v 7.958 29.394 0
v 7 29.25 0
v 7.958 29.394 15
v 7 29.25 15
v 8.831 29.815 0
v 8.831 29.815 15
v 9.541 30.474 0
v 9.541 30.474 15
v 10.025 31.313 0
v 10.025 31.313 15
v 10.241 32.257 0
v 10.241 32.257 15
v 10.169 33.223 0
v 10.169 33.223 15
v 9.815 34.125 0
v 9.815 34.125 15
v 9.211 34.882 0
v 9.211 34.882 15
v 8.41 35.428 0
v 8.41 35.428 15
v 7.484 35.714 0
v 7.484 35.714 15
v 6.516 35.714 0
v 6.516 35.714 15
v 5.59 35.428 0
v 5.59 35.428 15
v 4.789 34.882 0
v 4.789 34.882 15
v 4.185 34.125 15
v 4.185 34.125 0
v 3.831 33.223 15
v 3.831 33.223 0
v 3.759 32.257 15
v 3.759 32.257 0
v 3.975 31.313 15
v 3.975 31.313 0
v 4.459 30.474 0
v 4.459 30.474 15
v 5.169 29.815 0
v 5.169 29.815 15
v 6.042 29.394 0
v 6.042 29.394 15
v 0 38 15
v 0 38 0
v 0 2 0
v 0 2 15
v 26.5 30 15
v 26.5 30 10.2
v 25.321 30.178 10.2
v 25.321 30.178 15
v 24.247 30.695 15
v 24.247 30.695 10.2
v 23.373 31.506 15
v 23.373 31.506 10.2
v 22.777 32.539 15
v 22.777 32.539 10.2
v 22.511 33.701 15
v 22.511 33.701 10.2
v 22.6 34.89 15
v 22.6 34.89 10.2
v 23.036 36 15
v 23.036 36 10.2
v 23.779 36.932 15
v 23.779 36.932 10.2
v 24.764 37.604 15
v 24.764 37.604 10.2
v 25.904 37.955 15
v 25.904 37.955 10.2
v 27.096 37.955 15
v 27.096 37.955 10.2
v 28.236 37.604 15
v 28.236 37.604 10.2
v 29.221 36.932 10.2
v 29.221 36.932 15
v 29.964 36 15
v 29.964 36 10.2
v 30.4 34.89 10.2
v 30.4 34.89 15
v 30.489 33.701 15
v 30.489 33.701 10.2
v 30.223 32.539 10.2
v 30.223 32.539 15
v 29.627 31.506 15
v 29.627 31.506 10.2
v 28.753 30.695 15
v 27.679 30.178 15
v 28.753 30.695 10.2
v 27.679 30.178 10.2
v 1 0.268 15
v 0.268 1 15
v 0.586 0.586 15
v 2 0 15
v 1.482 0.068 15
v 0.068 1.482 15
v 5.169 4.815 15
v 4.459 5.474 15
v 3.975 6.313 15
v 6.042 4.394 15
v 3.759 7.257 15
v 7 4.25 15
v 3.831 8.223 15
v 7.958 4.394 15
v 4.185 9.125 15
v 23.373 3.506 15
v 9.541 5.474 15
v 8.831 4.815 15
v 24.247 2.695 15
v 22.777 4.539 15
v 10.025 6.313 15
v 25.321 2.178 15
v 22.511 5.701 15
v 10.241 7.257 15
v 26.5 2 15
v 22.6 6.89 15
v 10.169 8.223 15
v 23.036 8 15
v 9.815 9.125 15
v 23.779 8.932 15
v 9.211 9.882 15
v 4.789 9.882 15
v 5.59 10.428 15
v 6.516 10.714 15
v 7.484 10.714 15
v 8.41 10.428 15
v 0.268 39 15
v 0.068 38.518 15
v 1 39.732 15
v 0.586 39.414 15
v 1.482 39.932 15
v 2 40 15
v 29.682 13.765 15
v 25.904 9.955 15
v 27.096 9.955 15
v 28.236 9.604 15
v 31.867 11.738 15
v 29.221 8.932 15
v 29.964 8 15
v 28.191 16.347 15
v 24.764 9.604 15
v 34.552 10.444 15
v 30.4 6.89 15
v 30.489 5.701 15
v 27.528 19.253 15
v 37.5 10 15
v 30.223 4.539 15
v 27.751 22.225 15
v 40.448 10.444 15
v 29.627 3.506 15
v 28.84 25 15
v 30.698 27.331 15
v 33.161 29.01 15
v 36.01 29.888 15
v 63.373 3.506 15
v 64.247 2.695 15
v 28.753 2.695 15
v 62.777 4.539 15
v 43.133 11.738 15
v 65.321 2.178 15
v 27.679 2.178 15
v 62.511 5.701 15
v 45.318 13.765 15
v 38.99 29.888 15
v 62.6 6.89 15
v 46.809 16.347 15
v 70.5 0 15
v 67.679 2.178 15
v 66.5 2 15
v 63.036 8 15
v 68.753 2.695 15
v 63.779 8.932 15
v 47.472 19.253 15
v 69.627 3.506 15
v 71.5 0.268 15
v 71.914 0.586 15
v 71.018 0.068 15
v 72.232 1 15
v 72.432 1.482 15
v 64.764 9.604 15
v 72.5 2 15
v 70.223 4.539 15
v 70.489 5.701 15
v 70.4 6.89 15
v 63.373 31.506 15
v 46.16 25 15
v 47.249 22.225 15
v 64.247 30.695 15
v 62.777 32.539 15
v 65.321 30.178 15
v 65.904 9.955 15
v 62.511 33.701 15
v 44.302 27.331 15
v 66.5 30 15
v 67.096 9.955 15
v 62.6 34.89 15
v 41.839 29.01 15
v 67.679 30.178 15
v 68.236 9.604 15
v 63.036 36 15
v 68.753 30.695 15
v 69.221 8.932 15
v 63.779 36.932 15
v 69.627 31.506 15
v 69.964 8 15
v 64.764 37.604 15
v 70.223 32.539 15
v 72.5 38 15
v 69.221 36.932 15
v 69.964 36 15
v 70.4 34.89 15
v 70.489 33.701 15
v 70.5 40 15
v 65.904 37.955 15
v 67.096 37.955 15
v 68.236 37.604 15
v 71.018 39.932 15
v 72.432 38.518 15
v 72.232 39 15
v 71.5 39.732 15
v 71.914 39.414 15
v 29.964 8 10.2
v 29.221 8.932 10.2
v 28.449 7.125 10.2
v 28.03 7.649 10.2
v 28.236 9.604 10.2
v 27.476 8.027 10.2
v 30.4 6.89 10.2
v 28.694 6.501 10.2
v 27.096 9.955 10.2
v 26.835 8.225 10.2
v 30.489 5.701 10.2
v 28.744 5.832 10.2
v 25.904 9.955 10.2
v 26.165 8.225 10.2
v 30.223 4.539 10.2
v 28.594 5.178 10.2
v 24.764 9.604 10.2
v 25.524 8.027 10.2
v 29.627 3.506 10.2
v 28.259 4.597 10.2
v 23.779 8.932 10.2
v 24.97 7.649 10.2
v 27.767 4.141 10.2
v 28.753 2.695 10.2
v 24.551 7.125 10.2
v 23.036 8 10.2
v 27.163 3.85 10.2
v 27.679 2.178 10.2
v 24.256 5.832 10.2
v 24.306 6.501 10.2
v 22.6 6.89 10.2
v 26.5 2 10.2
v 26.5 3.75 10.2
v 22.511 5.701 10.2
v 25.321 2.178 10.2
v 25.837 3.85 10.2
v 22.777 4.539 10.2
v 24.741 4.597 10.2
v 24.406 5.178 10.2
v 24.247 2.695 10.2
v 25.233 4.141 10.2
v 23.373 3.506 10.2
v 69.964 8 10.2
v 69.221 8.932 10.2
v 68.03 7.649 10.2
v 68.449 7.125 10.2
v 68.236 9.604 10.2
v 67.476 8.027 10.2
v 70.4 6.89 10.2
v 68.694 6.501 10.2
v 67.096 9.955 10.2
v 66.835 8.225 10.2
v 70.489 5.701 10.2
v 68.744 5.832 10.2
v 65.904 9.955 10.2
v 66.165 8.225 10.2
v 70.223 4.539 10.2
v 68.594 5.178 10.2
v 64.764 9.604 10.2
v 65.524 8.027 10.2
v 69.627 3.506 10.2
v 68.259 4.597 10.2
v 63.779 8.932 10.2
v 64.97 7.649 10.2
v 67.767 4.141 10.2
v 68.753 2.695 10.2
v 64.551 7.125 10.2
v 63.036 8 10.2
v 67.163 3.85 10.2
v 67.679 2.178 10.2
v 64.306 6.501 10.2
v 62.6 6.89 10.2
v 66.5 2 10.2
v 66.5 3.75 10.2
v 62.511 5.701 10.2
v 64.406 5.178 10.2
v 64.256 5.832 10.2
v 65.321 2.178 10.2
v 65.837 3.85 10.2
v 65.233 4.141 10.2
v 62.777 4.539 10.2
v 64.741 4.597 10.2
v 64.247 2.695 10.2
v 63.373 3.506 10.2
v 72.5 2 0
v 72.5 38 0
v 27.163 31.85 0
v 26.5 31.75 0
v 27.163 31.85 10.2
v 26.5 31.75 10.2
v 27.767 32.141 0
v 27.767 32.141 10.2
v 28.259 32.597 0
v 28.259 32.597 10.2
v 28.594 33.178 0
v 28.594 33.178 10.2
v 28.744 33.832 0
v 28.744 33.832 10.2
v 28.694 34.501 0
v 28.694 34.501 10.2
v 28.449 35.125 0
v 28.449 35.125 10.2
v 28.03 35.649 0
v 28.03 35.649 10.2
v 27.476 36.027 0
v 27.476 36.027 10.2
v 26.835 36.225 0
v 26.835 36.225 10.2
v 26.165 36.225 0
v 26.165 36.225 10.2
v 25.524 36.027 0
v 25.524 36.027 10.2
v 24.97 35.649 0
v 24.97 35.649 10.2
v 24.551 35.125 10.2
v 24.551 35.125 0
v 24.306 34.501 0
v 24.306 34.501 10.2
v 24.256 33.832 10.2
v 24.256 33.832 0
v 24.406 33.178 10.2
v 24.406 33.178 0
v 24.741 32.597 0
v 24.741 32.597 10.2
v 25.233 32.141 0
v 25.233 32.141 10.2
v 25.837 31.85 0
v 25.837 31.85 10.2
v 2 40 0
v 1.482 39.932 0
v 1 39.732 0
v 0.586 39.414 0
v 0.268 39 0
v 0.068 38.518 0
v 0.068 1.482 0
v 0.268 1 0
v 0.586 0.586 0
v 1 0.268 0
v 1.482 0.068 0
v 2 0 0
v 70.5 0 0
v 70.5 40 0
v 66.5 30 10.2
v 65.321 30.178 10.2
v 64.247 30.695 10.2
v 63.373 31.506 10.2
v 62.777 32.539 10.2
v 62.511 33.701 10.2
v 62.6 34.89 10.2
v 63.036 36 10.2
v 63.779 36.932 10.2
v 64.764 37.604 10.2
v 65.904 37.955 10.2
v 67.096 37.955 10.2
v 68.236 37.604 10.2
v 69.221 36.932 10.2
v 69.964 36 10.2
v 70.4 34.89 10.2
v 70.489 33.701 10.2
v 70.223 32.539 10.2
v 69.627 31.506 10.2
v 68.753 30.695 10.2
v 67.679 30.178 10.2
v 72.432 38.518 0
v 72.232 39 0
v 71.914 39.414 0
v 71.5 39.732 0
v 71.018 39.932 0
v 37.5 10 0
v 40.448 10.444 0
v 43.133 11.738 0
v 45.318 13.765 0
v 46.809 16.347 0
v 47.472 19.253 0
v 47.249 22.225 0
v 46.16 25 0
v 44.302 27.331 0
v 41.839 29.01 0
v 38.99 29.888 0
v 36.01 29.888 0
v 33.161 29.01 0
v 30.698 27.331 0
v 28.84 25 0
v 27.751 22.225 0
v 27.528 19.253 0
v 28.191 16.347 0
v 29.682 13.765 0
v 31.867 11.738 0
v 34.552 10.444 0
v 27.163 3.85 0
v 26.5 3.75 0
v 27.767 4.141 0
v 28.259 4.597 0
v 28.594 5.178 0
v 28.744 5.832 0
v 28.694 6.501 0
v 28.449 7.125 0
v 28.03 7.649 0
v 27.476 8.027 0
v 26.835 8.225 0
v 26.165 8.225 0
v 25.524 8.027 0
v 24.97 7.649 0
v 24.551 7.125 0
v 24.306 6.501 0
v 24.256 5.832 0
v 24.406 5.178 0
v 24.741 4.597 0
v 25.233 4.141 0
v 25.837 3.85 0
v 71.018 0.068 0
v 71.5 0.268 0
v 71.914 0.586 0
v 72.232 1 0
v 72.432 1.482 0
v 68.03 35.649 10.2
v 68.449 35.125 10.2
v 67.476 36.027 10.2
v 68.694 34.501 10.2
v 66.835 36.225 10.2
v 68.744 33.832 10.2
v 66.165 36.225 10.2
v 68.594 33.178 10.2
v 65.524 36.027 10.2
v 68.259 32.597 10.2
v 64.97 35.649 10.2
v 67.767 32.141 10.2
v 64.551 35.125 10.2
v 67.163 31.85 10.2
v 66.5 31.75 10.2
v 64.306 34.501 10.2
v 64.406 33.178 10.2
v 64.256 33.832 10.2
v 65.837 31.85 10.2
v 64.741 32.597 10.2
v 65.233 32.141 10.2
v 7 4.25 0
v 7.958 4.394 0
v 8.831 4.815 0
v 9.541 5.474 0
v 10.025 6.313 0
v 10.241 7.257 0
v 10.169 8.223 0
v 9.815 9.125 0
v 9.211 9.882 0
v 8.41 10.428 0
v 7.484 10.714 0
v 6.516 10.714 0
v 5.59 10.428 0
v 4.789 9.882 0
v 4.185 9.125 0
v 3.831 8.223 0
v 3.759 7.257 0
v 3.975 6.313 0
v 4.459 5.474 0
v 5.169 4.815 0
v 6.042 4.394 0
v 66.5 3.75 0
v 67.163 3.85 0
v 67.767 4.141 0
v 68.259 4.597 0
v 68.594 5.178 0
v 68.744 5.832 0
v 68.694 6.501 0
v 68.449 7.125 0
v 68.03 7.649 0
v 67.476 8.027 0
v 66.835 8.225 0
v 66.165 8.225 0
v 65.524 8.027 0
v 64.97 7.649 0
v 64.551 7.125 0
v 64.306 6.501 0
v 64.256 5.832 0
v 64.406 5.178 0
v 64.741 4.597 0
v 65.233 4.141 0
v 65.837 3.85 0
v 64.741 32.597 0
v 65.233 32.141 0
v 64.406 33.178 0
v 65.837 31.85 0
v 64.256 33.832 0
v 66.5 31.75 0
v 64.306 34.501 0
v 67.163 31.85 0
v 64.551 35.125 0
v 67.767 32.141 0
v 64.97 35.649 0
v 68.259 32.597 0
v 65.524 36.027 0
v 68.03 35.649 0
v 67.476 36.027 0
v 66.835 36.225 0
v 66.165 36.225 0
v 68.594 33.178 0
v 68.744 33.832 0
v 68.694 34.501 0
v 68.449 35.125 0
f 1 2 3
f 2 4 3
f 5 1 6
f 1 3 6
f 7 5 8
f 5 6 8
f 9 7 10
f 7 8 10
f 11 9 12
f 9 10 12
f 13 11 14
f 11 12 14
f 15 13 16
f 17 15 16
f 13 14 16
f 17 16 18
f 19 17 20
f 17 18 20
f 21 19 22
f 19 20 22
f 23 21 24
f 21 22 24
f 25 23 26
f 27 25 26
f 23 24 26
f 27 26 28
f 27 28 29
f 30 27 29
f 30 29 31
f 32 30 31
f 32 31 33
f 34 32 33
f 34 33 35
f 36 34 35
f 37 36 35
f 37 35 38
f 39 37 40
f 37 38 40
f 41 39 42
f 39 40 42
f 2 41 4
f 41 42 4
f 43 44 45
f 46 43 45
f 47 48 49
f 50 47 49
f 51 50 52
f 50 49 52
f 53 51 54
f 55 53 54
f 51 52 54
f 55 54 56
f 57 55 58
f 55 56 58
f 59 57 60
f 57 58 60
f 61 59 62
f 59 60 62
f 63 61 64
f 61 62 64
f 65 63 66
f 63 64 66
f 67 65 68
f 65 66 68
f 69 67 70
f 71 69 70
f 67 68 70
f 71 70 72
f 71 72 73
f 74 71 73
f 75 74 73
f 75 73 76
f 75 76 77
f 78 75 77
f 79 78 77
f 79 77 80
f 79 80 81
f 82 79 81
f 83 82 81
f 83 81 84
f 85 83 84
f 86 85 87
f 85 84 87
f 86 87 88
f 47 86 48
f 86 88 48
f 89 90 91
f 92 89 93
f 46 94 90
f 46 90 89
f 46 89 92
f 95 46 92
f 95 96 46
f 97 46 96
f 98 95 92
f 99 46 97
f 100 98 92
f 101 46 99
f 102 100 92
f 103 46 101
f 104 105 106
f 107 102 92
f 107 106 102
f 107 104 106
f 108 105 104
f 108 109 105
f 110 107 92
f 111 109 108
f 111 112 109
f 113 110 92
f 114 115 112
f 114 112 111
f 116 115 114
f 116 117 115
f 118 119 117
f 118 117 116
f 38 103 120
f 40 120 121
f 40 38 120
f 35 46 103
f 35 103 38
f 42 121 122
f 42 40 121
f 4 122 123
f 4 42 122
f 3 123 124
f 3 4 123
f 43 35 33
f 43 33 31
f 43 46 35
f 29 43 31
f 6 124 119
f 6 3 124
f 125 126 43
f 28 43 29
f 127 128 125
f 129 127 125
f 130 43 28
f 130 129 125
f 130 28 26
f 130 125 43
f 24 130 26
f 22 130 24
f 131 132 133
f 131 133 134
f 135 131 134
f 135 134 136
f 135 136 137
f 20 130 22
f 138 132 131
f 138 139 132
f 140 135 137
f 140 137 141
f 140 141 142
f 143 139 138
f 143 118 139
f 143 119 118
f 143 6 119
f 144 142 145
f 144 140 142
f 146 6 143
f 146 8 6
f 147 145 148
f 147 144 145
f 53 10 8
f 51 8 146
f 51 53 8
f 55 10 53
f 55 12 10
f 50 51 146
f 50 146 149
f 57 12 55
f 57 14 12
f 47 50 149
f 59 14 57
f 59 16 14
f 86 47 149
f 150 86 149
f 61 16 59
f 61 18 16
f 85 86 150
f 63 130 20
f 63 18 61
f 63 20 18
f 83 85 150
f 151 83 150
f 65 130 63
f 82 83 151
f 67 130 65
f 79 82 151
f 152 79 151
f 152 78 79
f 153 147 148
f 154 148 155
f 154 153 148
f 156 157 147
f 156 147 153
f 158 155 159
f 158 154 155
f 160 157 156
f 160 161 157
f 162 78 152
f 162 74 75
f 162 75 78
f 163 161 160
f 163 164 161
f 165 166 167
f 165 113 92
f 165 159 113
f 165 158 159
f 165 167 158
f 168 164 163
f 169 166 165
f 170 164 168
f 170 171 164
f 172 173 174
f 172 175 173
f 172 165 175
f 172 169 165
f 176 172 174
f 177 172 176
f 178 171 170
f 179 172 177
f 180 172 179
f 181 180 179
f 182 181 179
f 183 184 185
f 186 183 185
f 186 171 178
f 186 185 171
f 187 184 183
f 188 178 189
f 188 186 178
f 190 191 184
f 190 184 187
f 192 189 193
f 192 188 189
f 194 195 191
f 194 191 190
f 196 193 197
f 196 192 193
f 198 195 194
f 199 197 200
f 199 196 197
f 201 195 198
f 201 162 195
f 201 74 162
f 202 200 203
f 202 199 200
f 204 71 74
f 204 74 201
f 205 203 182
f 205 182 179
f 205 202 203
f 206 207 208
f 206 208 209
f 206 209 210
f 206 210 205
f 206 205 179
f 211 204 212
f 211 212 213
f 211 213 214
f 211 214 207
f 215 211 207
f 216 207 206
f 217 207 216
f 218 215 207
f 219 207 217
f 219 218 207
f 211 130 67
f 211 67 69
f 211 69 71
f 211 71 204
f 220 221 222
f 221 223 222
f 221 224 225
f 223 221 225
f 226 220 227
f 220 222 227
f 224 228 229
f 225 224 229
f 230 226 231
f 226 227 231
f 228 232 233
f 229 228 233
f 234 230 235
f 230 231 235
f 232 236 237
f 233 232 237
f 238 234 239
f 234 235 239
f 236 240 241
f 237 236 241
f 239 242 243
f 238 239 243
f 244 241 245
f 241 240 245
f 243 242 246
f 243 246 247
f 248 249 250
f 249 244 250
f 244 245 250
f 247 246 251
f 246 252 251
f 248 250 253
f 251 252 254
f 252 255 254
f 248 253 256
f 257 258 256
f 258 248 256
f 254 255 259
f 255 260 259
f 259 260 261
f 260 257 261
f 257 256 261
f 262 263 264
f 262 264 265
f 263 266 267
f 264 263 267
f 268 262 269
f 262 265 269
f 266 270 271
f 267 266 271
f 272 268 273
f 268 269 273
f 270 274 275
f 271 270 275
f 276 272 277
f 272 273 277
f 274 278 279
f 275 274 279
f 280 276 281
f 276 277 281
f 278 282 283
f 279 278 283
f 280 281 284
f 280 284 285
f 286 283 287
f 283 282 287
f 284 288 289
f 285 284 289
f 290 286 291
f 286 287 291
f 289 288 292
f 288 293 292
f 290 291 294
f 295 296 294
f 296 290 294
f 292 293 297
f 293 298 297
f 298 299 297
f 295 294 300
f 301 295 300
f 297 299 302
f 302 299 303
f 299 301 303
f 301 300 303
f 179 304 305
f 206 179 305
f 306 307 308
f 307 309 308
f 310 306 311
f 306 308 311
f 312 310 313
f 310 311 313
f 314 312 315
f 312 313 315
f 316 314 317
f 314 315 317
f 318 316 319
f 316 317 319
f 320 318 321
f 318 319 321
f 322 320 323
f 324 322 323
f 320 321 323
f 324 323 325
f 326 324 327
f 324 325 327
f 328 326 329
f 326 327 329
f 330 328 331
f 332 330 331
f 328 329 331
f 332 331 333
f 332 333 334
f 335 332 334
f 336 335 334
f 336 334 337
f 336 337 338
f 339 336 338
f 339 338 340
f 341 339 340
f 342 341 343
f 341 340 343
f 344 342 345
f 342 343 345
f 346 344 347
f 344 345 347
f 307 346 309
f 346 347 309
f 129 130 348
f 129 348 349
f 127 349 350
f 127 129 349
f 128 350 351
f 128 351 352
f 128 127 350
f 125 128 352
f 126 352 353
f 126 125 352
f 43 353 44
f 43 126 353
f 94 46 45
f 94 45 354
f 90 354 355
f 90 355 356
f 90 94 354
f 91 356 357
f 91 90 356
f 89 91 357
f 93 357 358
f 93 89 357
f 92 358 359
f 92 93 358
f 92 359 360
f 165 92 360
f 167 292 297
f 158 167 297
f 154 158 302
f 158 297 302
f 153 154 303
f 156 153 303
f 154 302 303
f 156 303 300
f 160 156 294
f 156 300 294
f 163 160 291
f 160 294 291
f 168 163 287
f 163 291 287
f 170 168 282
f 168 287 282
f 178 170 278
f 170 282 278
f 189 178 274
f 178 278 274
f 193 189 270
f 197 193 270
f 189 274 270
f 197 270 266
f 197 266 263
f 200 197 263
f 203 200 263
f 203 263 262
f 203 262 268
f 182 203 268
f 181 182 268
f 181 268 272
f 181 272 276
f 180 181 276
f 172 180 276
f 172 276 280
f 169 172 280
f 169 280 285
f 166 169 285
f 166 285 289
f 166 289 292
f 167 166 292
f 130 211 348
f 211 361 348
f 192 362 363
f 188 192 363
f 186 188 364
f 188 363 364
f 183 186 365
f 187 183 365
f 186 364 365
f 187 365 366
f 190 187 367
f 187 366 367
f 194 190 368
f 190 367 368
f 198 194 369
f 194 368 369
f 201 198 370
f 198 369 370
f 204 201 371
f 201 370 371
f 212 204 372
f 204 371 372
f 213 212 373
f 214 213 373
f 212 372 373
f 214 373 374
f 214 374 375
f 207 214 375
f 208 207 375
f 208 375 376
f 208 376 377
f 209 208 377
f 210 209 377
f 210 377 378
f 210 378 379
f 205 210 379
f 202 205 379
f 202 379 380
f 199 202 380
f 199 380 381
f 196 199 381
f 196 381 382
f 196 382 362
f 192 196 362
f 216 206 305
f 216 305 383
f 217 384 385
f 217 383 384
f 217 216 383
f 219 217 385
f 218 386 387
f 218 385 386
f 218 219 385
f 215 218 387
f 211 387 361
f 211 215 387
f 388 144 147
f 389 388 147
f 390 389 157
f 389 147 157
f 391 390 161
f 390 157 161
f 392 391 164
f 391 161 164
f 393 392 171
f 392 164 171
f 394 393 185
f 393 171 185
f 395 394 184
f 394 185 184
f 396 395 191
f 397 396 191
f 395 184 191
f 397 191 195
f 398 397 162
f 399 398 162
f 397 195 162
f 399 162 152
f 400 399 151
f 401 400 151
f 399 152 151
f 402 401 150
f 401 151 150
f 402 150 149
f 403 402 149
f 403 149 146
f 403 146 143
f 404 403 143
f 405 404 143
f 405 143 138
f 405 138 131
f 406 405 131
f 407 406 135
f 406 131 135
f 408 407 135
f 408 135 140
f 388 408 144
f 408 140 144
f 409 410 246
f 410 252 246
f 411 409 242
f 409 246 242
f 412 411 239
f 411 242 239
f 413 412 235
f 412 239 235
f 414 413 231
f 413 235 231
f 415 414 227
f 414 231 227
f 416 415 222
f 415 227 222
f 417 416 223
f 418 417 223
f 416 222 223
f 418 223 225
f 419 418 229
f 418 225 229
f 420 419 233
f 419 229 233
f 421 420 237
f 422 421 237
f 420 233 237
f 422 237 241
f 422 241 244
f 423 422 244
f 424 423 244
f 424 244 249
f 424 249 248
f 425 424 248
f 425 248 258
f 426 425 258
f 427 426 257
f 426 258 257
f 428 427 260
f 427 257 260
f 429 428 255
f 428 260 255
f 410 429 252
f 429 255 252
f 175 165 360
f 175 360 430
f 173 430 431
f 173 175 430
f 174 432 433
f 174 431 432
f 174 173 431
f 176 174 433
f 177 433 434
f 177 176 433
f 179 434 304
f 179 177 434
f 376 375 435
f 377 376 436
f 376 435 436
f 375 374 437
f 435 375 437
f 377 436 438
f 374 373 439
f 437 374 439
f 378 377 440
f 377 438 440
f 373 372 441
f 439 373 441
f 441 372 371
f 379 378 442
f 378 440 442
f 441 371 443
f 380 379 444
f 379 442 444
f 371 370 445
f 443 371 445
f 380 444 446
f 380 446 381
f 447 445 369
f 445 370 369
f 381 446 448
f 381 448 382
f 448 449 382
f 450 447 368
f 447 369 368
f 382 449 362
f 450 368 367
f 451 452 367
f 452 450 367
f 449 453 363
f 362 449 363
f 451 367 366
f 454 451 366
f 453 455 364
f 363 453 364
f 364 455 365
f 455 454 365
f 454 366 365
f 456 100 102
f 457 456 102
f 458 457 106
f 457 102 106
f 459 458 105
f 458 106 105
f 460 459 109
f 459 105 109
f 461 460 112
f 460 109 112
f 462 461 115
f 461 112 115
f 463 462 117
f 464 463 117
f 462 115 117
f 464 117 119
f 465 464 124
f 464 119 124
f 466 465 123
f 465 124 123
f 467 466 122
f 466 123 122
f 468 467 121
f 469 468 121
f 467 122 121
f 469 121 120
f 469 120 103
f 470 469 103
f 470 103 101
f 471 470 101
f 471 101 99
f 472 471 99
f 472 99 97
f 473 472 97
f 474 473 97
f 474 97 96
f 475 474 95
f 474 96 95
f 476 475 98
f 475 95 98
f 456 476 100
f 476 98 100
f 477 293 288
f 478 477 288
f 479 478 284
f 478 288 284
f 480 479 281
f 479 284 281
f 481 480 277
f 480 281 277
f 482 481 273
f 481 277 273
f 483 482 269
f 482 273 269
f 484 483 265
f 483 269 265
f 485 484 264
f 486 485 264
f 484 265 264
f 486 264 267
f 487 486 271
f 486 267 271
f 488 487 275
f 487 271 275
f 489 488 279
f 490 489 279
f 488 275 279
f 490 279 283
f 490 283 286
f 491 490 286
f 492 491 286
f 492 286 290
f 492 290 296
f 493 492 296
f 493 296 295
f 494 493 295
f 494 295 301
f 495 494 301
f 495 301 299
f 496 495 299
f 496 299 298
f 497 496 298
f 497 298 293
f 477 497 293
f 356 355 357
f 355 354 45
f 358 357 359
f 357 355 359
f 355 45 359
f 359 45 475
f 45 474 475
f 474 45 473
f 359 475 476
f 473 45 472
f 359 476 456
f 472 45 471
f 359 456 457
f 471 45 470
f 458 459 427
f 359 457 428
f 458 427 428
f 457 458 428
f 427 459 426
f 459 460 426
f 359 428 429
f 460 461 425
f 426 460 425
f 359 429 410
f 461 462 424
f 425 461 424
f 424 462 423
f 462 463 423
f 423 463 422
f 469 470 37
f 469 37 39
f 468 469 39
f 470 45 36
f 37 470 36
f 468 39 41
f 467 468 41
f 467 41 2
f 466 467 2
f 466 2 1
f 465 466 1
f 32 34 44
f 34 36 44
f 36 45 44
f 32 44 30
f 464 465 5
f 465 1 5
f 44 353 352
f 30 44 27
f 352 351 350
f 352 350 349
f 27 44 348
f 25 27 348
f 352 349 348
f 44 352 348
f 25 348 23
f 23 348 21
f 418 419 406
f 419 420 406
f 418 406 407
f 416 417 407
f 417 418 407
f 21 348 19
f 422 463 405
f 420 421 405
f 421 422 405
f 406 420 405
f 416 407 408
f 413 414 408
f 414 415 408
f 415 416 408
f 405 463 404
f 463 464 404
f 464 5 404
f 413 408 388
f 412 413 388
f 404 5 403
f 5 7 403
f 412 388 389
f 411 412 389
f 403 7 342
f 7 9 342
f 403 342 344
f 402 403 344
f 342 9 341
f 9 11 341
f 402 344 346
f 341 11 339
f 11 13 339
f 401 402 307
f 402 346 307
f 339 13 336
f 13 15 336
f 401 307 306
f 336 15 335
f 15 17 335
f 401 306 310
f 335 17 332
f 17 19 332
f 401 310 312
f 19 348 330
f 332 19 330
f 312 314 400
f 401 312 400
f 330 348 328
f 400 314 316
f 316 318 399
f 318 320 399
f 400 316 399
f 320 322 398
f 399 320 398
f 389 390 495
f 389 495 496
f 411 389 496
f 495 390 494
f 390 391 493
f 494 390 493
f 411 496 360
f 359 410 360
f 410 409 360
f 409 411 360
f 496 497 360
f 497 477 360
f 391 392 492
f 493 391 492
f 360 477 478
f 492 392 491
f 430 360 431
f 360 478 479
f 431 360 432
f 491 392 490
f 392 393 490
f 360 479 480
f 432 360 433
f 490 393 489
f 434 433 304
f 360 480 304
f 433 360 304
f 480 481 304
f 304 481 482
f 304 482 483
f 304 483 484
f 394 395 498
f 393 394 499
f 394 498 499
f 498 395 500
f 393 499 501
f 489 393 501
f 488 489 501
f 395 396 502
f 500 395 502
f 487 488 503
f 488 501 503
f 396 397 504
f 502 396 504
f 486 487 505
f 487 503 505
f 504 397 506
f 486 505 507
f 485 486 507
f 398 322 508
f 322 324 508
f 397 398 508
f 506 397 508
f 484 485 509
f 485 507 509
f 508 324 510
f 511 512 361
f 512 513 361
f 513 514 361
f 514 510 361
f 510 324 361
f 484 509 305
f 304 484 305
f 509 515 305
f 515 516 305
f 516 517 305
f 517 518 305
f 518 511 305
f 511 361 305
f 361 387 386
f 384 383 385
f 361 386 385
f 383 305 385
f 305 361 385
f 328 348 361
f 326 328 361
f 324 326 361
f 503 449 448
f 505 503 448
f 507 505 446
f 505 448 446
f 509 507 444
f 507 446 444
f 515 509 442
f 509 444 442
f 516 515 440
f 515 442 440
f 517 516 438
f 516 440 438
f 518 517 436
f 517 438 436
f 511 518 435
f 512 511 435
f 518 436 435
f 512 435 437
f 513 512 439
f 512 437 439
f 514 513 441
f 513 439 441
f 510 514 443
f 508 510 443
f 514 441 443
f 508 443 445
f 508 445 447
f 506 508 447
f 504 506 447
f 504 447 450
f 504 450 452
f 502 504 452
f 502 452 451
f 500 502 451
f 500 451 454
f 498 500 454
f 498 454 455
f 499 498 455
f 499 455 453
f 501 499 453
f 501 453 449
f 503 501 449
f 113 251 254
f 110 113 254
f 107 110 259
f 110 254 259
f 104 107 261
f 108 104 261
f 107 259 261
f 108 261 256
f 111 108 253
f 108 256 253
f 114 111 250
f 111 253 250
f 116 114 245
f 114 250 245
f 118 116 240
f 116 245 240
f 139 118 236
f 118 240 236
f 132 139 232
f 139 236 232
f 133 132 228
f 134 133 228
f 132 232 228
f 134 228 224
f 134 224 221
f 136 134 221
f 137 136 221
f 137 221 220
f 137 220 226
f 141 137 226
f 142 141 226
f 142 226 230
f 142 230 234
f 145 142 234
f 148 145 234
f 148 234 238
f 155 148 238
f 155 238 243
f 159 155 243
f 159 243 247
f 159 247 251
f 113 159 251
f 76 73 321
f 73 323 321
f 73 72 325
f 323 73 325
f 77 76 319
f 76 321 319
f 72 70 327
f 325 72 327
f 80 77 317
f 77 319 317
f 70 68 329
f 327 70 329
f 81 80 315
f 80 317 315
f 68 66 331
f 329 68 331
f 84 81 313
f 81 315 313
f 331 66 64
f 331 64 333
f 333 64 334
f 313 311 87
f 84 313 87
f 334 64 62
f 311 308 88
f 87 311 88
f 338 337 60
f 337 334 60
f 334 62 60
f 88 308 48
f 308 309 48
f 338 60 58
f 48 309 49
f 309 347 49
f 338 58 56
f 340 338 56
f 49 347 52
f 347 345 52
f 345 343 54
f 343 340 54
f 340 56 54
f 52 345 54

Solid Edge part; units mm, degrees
sketch "Sketch1" plane through (0, 0, 0) normal (0, 0, 1) x (1, 0, 0)
  line L0 (72.5, 40) -> (0, 40)
  line L1 (0, 40) -> (0, 0)
  line L2 (0, 0) -> (72.5, 0)
  line L3 (72.5, 0) -> (72.5, 40)
extrude "Extrusionsausprägung_1" add sketch "Sketch1" along normal blind 15
hole "Bohrung_1" at (26.5, 34, 15) direction (0, 0, -1) diameter 4.5 end through all counterbore diameter 8 counterbore depth 4.8
hole "Hole1" at (26.5, 6, 15) direction (0, 0, -1) diameter 4.5 end through all counterbore diameter 8 counterbore depth 4.8
hole "Hole2" at (66.5, 34, 15) direction (0, 0, -1) diameter 4.5 end through all counterbore diameter 8 counterbore depth 4.8
hole "Hole3" at (66.5, 6, 15) direction (0, 0, -1) diameter 4.5 end through all counterbore diameter 8 counterbore depth 4.8
hole "Bohrung_12" at (37.5, 20, 15) direction (0, 0, -1) diameter 20 end through all
hole "Bohrung_15" at (7, 32.5, 15) direction (0, 0, -1) diameter 6.5 end through all
hole "Hole4" at (7, 7.5, 15) direction (0, 0, -1) diameter 6.5 end through all
fillet "Verrundung_2" radius 2 4 edges at (0, 40, 7.5) (72.5, 40, 7.5) (72.5, 0, 7.5) (0, 0, 7.5)
